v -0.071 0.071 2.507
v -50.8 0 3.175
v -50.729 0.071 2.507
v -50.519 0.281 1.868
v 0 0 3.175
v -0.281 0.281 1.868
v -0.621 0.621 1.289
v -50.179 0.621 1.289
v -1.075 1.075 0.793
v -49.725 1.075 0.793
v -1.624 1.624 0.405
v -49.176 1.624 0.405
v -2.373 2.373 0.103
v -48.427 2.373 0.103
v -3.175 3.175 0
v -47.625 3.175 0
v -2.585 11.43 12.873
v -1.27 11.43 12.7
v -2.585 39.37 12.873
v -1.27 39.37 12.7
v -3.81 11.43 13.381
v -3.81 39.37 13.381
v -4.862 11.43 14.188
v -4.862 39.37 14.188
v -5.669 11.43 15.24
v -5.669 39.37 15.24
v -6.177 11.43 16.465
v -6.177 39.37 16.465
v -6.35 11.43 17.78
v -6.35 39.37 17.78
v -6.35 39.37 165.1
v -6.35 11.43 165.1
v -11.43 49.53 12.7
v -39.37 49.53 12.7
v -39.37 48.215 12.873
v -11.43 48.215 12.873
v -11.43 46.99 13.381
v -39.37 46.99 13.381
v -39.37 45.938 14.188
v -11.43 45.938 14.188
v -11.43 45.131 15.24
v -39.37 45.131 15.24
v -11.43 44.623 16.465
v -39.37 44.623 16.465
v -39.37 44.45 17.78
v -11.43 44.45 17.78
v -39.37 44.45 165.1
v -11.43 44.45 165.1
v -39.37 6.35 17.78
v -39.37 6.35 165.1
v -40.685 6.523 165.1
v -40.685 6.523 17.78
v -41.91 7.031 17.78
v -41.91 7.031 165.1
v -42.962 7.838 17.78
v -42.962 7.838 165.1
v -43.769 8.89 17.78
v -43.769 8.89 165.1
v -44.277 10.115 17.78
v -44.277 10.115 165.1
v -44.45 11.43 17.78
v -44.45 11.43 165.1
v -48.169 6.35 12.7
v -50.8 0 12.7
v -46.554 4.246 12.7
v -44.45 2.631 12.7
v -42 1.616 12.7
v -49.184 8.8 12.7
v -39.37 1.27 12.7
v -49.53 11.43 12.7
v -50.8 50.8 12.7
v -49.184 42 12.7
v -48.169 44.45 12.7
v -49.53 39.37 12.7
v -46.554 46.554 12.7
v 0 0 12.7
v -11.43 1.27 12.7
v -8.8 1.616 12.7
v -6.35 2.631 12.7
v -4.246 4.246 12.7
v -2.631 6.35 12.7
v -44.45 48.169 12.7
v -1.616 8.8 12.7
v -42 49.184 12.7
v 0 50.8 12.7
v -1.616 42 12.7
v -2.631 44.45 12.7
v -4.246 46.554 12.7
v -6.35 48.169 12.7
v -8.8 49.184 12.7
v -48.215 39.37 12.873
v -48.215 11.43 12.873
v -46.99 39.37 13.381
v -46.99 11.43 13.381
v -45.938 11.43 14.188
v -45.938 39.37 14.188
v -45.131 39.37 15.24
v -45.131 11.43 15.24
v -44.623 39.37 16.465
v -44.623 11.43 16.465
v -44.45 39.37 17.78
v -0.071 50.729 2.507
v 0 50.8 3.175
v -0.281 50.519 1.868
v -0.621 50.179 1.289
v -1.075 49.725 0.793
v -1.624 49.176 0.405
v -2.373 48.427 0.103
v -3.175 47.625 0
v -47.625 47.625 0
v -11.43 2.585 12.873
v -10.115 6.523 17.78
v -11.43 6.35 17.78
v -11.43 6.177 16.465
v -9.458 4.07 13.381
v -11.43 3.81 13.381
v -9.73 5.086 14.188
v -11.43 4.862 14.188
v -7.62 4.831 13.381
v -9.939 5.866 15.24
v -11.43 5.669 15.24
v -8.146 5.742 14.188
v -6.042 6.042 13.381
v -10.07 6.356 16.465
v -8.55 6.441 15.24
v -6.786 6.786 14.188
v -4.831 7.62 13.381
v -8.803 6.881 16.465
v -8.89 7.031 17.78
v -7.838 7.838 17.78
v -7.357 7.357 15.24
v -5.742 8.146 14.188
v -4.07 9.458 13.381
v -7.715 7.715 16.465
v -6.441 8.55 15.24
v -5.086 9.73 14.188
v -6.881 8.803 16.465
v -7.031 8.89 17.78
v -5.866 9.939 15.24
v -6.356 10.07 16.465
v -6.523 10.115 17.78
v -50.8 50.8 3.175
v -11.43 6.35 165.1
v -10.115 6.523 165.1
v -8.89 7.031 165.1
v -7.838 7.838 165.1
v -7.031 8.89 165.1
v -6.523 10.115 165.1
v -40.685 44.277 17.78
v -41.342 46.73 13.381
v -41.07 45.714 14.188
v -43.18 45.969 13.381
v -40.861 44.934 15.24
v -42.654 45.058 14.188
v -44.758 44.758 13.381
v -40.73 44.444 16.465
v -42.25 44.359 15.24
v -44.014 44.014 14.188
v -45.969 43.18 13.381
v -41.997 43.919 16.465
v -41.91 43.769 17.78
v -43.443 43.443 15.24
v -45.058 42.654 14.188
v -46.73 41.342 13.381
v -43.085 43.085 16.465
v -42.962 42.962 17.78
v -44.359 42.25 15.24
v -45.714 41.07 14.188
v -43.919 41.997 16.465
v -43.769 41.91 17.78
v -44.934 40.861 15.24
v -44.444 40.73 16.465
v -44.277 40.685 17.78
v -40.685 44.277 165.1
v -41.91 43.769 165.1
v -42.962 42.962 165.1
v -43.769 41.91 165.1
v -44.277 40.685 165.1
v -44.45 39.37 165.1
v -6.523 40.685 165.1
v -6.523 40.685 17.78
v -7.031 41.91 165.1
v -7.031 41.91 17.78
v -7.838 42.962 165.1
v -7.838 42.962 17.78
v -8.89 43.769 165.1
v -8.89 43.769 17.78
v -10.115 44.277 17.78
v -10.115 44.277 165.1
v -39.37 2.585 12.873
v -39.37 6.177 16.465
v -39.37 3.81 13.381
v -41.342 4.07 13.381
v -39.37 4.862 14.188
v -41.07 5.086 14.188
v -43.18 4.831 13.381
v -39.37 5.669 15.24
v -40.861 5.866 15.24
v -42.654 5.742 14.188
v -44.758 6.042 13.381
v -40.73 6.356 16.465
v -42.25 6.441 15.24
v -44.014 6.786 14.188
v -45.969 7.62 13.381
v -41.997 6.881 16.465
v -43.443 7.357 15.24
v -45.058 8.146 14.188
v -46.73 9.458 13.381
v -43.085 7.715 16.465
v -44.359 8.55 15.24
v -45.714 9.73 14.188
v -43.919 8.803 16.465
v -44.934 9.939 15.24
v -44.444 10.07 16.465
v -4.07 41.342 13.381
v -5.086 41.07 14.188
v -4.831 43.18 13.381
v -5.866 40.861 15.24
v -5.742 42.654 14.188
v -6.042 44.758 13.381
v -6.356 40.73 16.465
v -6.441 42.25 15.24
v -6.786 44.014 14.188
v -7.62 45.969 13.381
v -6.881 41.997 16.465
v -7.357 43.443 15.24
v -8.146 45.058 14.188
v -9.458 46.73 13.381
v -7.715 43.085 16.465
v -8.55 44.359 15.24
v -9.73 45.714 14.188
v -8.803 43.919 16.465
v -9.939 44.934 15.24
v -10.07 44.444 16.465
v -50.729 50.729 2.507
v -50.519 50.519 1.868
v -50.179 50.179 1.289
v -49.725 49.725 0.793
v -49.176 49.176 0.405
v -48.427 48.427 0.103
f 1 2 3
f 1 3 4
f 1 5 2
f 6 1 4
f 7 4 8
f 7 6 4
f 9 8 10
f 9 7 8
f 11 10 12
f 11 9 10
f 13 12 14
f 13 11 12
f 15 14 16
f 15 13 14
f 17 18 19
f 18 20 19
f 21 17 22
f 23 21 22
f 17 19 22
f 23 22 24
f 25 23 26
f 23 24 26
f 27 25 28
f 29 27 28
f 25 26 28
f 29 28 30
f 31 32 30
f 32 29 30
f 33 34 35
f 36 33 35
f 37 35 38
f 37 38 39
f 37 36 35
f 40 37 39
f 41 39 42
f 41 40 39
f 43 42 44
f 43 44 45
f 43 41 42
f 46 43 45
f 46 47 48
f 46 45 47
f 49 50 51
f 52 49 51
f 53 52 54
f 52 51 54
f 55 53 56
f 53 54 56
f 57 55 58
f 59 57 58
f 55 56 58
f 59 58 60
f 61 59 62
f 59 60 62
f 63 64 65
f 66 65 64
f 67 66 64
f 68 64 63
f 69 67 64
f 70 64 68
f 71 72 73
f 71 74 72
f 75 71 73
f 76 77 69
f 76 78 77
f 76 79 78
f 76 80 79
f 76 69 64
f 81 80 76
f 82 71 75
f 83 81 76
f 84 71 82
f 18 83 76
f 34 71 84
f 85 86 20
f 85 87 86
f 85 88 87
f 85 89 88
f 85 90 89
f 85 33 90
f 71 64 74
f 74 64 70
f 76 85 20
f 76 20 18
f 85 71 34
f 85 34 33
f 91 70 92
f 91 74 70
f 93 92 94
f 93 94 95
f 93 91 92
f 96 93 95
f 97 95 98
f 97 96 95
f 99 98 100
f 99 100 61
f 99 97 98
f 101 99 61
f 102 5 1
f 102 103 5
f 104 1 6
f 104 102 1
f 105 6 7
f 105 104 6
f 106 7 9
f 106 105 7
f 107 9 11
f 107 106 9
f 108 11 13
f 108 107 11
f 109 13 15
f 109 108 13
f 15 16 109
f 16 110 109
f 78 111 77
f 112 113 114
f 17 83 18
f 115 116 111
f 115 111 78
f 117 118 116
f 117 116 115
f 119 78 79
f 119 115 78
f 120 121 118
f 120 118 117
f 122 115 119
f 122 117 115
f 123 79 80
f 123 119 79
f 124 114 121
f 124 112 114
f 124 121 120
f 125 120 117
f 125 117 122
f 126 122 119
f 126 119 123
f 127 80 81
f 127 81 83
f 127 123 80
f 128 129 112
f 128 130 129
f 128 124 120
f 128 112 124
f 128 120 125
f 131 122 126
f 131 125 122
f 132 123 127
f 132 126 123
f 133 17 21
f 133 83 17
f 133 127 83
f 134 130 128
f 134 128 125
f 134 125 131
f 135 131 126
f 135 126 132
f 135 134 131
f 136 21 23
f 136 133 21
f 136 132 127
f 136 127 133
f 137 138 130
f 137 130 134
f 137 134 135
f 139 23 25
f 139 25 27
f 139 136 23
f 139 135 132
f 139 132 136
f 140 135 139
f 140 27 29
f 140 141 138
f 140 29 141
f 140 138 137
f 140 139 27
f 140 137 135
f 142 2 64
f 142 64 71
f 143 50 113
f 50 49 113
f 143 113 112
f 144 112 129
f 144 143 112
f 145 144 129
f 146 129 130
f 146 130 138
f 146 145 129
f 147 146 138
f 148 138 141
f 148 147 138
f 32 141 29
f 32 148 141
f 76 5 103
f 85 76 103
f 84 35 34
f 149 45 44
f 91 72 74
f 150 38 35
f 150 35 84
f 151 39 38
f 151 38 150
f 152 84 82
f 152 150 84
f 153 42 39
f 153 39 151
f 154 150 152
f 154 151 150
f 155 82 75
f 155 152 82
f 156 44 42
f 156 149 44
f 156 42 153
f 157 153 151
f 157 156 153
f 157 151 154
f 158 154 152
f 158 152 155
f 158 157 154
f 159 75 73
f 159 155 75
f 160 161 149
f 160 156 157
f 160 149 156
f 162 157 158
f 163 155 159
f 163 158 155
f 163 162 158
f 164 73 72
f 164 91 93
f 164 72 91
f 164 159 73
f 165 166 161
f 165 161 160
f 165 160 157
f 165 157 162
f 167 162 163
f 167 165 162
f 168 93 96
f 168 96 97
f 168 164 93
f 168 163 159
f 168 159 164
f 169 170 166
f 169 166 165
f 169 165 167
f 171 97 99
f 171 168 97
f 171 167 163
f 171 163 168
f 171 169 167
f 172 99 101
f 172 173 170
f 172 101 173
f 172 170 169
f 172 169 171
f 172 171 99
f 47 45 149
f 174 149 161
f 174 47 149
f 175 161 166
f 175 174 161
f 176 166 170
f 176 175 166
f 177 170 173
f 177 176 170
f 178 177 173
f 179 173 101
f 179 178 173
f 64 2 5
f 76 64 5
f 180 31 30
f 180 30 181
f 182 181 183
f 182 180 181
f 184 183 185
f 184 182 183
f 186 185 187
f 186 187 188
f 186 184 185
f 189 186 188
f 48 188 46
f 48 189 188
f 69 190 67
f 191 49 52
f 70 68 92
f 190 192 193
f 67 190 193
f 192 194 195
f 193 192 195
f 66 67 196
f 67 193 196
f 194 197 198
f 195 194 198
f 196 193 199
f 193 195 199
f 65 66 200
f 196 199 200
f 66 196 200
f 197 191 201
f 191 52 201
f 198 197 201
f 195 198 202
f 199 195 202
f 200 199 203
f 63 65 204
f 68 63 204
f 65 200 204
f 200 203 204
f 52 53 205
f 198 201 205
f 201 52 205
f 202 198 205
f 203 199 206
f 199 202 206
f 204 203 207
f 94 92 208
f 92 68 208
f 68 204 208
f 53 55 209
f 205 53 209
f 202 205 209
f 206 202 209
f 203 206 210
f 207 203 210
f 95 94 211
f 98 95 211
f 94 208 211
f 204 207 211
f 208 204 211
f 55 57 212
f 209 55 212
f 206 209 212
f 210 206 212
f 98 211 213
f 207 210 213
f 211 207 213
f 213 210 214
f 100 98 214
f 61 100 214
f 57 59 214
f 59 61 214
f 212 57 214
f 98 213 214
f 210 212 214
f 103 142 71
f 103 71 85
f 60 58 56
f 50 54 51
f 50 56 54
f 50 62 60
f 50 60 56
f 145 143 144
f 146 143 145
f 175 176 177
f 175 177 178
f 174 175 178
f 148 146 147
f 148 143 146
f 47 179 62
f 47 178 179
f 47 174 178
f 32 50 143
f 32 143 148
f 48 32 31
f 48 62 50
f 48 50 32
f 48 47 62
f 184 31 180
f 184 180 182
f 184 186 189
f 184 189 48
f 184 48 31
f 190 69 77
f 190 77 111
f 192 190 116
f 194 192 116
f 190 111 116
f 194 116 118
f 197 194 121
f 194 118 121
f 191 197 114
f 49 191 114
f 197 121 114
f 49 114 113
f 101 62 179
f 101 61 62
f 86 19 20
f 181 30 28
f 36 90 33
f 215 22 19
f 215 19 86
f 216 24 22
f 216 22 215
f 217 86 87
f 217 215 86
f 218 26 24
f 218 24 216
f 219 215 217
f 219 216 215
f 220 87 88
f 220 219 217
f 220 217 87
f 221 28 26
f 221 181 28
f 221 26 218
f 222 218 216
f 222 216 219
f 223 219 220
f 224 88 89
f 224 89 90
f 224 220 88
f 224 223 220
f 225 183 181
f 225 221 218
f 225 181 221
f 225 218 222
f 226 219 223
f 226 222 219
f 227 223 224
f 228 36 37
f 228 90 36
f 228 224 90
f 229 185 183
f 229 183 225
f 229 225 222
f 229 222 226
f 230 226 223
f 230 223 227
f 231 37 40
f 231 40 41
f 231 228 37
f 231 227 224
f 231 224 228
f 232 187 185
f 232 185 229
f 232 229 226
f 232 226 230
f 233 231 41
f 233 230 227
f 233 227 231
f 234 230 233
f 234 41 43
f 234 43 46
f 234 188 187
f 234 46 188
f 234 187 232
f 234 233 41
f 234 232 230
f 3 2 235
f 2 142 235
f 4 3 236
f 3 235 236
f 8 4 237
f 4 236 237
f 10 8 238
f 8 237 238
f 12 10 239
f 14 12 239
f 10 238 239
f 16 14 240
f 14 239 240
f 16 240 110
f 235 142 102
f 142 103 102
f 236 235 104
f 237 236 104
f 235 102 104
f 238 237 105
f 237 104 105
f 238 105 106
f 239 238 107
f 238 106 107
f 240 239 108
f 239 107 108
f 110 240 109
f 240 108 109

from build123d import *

# Parameters (mm, degrees)
F0_W     = 50.8
F0_H     = 50.8
F1_DEPTH = 12.7
F2_W     = 38.1
F2_H     = 38.1
F3_DEPTH = 152.4
F4_R     = 5.08
F5_R     = 3.175


with BuildPart() as f1:
    # F0 (on Top) → F1 (new body)
    with BuildSketch(Plane.XY):
        with Locations((-25.4, 25.4)):
            Rectangle(F0_W, F0_H)
    extrude(amount=F1_DEPTH)

    # F2 (on face) → F3 (join)
    with BuildSketch(Plane.XY.offset(12.7)):
        with Locations((-25.4, 25.4)):
            Rectangle(F2_W, F2_H)
    extrude(amount=F3_DEPTH)

    # F4
    f4_edges = [f1.edges().sort_by_distance(p)[0] for p in [
        (-25.4, 6.35, 12.7),
        (-6.35, 25.4, 12.7),
        (-25.4, 44.45, 12.7),
        (-44.45, 25.4, 12.7),
        (-44.45, 44.45, 88.9),
        (-44.45, 6.35, 88.9),
        (-6.35, 6.35, 88.9),
        (-6.35, 44.45, 88.9),
    ]]
    fillet(f4_edges, radius=F4_R)

    # F5
    f5_edges = [f1.edges().sort_by_distance(p)[0] for p in [
        (-25.4, 0, 0),
        (0, 25.4, 0),
        (-25.4, 50.8, 0),
        (-50.8, 25.4, 0),
    ]]
    fillet(f5_edges, radius=F5_R)


solid = f1.part
